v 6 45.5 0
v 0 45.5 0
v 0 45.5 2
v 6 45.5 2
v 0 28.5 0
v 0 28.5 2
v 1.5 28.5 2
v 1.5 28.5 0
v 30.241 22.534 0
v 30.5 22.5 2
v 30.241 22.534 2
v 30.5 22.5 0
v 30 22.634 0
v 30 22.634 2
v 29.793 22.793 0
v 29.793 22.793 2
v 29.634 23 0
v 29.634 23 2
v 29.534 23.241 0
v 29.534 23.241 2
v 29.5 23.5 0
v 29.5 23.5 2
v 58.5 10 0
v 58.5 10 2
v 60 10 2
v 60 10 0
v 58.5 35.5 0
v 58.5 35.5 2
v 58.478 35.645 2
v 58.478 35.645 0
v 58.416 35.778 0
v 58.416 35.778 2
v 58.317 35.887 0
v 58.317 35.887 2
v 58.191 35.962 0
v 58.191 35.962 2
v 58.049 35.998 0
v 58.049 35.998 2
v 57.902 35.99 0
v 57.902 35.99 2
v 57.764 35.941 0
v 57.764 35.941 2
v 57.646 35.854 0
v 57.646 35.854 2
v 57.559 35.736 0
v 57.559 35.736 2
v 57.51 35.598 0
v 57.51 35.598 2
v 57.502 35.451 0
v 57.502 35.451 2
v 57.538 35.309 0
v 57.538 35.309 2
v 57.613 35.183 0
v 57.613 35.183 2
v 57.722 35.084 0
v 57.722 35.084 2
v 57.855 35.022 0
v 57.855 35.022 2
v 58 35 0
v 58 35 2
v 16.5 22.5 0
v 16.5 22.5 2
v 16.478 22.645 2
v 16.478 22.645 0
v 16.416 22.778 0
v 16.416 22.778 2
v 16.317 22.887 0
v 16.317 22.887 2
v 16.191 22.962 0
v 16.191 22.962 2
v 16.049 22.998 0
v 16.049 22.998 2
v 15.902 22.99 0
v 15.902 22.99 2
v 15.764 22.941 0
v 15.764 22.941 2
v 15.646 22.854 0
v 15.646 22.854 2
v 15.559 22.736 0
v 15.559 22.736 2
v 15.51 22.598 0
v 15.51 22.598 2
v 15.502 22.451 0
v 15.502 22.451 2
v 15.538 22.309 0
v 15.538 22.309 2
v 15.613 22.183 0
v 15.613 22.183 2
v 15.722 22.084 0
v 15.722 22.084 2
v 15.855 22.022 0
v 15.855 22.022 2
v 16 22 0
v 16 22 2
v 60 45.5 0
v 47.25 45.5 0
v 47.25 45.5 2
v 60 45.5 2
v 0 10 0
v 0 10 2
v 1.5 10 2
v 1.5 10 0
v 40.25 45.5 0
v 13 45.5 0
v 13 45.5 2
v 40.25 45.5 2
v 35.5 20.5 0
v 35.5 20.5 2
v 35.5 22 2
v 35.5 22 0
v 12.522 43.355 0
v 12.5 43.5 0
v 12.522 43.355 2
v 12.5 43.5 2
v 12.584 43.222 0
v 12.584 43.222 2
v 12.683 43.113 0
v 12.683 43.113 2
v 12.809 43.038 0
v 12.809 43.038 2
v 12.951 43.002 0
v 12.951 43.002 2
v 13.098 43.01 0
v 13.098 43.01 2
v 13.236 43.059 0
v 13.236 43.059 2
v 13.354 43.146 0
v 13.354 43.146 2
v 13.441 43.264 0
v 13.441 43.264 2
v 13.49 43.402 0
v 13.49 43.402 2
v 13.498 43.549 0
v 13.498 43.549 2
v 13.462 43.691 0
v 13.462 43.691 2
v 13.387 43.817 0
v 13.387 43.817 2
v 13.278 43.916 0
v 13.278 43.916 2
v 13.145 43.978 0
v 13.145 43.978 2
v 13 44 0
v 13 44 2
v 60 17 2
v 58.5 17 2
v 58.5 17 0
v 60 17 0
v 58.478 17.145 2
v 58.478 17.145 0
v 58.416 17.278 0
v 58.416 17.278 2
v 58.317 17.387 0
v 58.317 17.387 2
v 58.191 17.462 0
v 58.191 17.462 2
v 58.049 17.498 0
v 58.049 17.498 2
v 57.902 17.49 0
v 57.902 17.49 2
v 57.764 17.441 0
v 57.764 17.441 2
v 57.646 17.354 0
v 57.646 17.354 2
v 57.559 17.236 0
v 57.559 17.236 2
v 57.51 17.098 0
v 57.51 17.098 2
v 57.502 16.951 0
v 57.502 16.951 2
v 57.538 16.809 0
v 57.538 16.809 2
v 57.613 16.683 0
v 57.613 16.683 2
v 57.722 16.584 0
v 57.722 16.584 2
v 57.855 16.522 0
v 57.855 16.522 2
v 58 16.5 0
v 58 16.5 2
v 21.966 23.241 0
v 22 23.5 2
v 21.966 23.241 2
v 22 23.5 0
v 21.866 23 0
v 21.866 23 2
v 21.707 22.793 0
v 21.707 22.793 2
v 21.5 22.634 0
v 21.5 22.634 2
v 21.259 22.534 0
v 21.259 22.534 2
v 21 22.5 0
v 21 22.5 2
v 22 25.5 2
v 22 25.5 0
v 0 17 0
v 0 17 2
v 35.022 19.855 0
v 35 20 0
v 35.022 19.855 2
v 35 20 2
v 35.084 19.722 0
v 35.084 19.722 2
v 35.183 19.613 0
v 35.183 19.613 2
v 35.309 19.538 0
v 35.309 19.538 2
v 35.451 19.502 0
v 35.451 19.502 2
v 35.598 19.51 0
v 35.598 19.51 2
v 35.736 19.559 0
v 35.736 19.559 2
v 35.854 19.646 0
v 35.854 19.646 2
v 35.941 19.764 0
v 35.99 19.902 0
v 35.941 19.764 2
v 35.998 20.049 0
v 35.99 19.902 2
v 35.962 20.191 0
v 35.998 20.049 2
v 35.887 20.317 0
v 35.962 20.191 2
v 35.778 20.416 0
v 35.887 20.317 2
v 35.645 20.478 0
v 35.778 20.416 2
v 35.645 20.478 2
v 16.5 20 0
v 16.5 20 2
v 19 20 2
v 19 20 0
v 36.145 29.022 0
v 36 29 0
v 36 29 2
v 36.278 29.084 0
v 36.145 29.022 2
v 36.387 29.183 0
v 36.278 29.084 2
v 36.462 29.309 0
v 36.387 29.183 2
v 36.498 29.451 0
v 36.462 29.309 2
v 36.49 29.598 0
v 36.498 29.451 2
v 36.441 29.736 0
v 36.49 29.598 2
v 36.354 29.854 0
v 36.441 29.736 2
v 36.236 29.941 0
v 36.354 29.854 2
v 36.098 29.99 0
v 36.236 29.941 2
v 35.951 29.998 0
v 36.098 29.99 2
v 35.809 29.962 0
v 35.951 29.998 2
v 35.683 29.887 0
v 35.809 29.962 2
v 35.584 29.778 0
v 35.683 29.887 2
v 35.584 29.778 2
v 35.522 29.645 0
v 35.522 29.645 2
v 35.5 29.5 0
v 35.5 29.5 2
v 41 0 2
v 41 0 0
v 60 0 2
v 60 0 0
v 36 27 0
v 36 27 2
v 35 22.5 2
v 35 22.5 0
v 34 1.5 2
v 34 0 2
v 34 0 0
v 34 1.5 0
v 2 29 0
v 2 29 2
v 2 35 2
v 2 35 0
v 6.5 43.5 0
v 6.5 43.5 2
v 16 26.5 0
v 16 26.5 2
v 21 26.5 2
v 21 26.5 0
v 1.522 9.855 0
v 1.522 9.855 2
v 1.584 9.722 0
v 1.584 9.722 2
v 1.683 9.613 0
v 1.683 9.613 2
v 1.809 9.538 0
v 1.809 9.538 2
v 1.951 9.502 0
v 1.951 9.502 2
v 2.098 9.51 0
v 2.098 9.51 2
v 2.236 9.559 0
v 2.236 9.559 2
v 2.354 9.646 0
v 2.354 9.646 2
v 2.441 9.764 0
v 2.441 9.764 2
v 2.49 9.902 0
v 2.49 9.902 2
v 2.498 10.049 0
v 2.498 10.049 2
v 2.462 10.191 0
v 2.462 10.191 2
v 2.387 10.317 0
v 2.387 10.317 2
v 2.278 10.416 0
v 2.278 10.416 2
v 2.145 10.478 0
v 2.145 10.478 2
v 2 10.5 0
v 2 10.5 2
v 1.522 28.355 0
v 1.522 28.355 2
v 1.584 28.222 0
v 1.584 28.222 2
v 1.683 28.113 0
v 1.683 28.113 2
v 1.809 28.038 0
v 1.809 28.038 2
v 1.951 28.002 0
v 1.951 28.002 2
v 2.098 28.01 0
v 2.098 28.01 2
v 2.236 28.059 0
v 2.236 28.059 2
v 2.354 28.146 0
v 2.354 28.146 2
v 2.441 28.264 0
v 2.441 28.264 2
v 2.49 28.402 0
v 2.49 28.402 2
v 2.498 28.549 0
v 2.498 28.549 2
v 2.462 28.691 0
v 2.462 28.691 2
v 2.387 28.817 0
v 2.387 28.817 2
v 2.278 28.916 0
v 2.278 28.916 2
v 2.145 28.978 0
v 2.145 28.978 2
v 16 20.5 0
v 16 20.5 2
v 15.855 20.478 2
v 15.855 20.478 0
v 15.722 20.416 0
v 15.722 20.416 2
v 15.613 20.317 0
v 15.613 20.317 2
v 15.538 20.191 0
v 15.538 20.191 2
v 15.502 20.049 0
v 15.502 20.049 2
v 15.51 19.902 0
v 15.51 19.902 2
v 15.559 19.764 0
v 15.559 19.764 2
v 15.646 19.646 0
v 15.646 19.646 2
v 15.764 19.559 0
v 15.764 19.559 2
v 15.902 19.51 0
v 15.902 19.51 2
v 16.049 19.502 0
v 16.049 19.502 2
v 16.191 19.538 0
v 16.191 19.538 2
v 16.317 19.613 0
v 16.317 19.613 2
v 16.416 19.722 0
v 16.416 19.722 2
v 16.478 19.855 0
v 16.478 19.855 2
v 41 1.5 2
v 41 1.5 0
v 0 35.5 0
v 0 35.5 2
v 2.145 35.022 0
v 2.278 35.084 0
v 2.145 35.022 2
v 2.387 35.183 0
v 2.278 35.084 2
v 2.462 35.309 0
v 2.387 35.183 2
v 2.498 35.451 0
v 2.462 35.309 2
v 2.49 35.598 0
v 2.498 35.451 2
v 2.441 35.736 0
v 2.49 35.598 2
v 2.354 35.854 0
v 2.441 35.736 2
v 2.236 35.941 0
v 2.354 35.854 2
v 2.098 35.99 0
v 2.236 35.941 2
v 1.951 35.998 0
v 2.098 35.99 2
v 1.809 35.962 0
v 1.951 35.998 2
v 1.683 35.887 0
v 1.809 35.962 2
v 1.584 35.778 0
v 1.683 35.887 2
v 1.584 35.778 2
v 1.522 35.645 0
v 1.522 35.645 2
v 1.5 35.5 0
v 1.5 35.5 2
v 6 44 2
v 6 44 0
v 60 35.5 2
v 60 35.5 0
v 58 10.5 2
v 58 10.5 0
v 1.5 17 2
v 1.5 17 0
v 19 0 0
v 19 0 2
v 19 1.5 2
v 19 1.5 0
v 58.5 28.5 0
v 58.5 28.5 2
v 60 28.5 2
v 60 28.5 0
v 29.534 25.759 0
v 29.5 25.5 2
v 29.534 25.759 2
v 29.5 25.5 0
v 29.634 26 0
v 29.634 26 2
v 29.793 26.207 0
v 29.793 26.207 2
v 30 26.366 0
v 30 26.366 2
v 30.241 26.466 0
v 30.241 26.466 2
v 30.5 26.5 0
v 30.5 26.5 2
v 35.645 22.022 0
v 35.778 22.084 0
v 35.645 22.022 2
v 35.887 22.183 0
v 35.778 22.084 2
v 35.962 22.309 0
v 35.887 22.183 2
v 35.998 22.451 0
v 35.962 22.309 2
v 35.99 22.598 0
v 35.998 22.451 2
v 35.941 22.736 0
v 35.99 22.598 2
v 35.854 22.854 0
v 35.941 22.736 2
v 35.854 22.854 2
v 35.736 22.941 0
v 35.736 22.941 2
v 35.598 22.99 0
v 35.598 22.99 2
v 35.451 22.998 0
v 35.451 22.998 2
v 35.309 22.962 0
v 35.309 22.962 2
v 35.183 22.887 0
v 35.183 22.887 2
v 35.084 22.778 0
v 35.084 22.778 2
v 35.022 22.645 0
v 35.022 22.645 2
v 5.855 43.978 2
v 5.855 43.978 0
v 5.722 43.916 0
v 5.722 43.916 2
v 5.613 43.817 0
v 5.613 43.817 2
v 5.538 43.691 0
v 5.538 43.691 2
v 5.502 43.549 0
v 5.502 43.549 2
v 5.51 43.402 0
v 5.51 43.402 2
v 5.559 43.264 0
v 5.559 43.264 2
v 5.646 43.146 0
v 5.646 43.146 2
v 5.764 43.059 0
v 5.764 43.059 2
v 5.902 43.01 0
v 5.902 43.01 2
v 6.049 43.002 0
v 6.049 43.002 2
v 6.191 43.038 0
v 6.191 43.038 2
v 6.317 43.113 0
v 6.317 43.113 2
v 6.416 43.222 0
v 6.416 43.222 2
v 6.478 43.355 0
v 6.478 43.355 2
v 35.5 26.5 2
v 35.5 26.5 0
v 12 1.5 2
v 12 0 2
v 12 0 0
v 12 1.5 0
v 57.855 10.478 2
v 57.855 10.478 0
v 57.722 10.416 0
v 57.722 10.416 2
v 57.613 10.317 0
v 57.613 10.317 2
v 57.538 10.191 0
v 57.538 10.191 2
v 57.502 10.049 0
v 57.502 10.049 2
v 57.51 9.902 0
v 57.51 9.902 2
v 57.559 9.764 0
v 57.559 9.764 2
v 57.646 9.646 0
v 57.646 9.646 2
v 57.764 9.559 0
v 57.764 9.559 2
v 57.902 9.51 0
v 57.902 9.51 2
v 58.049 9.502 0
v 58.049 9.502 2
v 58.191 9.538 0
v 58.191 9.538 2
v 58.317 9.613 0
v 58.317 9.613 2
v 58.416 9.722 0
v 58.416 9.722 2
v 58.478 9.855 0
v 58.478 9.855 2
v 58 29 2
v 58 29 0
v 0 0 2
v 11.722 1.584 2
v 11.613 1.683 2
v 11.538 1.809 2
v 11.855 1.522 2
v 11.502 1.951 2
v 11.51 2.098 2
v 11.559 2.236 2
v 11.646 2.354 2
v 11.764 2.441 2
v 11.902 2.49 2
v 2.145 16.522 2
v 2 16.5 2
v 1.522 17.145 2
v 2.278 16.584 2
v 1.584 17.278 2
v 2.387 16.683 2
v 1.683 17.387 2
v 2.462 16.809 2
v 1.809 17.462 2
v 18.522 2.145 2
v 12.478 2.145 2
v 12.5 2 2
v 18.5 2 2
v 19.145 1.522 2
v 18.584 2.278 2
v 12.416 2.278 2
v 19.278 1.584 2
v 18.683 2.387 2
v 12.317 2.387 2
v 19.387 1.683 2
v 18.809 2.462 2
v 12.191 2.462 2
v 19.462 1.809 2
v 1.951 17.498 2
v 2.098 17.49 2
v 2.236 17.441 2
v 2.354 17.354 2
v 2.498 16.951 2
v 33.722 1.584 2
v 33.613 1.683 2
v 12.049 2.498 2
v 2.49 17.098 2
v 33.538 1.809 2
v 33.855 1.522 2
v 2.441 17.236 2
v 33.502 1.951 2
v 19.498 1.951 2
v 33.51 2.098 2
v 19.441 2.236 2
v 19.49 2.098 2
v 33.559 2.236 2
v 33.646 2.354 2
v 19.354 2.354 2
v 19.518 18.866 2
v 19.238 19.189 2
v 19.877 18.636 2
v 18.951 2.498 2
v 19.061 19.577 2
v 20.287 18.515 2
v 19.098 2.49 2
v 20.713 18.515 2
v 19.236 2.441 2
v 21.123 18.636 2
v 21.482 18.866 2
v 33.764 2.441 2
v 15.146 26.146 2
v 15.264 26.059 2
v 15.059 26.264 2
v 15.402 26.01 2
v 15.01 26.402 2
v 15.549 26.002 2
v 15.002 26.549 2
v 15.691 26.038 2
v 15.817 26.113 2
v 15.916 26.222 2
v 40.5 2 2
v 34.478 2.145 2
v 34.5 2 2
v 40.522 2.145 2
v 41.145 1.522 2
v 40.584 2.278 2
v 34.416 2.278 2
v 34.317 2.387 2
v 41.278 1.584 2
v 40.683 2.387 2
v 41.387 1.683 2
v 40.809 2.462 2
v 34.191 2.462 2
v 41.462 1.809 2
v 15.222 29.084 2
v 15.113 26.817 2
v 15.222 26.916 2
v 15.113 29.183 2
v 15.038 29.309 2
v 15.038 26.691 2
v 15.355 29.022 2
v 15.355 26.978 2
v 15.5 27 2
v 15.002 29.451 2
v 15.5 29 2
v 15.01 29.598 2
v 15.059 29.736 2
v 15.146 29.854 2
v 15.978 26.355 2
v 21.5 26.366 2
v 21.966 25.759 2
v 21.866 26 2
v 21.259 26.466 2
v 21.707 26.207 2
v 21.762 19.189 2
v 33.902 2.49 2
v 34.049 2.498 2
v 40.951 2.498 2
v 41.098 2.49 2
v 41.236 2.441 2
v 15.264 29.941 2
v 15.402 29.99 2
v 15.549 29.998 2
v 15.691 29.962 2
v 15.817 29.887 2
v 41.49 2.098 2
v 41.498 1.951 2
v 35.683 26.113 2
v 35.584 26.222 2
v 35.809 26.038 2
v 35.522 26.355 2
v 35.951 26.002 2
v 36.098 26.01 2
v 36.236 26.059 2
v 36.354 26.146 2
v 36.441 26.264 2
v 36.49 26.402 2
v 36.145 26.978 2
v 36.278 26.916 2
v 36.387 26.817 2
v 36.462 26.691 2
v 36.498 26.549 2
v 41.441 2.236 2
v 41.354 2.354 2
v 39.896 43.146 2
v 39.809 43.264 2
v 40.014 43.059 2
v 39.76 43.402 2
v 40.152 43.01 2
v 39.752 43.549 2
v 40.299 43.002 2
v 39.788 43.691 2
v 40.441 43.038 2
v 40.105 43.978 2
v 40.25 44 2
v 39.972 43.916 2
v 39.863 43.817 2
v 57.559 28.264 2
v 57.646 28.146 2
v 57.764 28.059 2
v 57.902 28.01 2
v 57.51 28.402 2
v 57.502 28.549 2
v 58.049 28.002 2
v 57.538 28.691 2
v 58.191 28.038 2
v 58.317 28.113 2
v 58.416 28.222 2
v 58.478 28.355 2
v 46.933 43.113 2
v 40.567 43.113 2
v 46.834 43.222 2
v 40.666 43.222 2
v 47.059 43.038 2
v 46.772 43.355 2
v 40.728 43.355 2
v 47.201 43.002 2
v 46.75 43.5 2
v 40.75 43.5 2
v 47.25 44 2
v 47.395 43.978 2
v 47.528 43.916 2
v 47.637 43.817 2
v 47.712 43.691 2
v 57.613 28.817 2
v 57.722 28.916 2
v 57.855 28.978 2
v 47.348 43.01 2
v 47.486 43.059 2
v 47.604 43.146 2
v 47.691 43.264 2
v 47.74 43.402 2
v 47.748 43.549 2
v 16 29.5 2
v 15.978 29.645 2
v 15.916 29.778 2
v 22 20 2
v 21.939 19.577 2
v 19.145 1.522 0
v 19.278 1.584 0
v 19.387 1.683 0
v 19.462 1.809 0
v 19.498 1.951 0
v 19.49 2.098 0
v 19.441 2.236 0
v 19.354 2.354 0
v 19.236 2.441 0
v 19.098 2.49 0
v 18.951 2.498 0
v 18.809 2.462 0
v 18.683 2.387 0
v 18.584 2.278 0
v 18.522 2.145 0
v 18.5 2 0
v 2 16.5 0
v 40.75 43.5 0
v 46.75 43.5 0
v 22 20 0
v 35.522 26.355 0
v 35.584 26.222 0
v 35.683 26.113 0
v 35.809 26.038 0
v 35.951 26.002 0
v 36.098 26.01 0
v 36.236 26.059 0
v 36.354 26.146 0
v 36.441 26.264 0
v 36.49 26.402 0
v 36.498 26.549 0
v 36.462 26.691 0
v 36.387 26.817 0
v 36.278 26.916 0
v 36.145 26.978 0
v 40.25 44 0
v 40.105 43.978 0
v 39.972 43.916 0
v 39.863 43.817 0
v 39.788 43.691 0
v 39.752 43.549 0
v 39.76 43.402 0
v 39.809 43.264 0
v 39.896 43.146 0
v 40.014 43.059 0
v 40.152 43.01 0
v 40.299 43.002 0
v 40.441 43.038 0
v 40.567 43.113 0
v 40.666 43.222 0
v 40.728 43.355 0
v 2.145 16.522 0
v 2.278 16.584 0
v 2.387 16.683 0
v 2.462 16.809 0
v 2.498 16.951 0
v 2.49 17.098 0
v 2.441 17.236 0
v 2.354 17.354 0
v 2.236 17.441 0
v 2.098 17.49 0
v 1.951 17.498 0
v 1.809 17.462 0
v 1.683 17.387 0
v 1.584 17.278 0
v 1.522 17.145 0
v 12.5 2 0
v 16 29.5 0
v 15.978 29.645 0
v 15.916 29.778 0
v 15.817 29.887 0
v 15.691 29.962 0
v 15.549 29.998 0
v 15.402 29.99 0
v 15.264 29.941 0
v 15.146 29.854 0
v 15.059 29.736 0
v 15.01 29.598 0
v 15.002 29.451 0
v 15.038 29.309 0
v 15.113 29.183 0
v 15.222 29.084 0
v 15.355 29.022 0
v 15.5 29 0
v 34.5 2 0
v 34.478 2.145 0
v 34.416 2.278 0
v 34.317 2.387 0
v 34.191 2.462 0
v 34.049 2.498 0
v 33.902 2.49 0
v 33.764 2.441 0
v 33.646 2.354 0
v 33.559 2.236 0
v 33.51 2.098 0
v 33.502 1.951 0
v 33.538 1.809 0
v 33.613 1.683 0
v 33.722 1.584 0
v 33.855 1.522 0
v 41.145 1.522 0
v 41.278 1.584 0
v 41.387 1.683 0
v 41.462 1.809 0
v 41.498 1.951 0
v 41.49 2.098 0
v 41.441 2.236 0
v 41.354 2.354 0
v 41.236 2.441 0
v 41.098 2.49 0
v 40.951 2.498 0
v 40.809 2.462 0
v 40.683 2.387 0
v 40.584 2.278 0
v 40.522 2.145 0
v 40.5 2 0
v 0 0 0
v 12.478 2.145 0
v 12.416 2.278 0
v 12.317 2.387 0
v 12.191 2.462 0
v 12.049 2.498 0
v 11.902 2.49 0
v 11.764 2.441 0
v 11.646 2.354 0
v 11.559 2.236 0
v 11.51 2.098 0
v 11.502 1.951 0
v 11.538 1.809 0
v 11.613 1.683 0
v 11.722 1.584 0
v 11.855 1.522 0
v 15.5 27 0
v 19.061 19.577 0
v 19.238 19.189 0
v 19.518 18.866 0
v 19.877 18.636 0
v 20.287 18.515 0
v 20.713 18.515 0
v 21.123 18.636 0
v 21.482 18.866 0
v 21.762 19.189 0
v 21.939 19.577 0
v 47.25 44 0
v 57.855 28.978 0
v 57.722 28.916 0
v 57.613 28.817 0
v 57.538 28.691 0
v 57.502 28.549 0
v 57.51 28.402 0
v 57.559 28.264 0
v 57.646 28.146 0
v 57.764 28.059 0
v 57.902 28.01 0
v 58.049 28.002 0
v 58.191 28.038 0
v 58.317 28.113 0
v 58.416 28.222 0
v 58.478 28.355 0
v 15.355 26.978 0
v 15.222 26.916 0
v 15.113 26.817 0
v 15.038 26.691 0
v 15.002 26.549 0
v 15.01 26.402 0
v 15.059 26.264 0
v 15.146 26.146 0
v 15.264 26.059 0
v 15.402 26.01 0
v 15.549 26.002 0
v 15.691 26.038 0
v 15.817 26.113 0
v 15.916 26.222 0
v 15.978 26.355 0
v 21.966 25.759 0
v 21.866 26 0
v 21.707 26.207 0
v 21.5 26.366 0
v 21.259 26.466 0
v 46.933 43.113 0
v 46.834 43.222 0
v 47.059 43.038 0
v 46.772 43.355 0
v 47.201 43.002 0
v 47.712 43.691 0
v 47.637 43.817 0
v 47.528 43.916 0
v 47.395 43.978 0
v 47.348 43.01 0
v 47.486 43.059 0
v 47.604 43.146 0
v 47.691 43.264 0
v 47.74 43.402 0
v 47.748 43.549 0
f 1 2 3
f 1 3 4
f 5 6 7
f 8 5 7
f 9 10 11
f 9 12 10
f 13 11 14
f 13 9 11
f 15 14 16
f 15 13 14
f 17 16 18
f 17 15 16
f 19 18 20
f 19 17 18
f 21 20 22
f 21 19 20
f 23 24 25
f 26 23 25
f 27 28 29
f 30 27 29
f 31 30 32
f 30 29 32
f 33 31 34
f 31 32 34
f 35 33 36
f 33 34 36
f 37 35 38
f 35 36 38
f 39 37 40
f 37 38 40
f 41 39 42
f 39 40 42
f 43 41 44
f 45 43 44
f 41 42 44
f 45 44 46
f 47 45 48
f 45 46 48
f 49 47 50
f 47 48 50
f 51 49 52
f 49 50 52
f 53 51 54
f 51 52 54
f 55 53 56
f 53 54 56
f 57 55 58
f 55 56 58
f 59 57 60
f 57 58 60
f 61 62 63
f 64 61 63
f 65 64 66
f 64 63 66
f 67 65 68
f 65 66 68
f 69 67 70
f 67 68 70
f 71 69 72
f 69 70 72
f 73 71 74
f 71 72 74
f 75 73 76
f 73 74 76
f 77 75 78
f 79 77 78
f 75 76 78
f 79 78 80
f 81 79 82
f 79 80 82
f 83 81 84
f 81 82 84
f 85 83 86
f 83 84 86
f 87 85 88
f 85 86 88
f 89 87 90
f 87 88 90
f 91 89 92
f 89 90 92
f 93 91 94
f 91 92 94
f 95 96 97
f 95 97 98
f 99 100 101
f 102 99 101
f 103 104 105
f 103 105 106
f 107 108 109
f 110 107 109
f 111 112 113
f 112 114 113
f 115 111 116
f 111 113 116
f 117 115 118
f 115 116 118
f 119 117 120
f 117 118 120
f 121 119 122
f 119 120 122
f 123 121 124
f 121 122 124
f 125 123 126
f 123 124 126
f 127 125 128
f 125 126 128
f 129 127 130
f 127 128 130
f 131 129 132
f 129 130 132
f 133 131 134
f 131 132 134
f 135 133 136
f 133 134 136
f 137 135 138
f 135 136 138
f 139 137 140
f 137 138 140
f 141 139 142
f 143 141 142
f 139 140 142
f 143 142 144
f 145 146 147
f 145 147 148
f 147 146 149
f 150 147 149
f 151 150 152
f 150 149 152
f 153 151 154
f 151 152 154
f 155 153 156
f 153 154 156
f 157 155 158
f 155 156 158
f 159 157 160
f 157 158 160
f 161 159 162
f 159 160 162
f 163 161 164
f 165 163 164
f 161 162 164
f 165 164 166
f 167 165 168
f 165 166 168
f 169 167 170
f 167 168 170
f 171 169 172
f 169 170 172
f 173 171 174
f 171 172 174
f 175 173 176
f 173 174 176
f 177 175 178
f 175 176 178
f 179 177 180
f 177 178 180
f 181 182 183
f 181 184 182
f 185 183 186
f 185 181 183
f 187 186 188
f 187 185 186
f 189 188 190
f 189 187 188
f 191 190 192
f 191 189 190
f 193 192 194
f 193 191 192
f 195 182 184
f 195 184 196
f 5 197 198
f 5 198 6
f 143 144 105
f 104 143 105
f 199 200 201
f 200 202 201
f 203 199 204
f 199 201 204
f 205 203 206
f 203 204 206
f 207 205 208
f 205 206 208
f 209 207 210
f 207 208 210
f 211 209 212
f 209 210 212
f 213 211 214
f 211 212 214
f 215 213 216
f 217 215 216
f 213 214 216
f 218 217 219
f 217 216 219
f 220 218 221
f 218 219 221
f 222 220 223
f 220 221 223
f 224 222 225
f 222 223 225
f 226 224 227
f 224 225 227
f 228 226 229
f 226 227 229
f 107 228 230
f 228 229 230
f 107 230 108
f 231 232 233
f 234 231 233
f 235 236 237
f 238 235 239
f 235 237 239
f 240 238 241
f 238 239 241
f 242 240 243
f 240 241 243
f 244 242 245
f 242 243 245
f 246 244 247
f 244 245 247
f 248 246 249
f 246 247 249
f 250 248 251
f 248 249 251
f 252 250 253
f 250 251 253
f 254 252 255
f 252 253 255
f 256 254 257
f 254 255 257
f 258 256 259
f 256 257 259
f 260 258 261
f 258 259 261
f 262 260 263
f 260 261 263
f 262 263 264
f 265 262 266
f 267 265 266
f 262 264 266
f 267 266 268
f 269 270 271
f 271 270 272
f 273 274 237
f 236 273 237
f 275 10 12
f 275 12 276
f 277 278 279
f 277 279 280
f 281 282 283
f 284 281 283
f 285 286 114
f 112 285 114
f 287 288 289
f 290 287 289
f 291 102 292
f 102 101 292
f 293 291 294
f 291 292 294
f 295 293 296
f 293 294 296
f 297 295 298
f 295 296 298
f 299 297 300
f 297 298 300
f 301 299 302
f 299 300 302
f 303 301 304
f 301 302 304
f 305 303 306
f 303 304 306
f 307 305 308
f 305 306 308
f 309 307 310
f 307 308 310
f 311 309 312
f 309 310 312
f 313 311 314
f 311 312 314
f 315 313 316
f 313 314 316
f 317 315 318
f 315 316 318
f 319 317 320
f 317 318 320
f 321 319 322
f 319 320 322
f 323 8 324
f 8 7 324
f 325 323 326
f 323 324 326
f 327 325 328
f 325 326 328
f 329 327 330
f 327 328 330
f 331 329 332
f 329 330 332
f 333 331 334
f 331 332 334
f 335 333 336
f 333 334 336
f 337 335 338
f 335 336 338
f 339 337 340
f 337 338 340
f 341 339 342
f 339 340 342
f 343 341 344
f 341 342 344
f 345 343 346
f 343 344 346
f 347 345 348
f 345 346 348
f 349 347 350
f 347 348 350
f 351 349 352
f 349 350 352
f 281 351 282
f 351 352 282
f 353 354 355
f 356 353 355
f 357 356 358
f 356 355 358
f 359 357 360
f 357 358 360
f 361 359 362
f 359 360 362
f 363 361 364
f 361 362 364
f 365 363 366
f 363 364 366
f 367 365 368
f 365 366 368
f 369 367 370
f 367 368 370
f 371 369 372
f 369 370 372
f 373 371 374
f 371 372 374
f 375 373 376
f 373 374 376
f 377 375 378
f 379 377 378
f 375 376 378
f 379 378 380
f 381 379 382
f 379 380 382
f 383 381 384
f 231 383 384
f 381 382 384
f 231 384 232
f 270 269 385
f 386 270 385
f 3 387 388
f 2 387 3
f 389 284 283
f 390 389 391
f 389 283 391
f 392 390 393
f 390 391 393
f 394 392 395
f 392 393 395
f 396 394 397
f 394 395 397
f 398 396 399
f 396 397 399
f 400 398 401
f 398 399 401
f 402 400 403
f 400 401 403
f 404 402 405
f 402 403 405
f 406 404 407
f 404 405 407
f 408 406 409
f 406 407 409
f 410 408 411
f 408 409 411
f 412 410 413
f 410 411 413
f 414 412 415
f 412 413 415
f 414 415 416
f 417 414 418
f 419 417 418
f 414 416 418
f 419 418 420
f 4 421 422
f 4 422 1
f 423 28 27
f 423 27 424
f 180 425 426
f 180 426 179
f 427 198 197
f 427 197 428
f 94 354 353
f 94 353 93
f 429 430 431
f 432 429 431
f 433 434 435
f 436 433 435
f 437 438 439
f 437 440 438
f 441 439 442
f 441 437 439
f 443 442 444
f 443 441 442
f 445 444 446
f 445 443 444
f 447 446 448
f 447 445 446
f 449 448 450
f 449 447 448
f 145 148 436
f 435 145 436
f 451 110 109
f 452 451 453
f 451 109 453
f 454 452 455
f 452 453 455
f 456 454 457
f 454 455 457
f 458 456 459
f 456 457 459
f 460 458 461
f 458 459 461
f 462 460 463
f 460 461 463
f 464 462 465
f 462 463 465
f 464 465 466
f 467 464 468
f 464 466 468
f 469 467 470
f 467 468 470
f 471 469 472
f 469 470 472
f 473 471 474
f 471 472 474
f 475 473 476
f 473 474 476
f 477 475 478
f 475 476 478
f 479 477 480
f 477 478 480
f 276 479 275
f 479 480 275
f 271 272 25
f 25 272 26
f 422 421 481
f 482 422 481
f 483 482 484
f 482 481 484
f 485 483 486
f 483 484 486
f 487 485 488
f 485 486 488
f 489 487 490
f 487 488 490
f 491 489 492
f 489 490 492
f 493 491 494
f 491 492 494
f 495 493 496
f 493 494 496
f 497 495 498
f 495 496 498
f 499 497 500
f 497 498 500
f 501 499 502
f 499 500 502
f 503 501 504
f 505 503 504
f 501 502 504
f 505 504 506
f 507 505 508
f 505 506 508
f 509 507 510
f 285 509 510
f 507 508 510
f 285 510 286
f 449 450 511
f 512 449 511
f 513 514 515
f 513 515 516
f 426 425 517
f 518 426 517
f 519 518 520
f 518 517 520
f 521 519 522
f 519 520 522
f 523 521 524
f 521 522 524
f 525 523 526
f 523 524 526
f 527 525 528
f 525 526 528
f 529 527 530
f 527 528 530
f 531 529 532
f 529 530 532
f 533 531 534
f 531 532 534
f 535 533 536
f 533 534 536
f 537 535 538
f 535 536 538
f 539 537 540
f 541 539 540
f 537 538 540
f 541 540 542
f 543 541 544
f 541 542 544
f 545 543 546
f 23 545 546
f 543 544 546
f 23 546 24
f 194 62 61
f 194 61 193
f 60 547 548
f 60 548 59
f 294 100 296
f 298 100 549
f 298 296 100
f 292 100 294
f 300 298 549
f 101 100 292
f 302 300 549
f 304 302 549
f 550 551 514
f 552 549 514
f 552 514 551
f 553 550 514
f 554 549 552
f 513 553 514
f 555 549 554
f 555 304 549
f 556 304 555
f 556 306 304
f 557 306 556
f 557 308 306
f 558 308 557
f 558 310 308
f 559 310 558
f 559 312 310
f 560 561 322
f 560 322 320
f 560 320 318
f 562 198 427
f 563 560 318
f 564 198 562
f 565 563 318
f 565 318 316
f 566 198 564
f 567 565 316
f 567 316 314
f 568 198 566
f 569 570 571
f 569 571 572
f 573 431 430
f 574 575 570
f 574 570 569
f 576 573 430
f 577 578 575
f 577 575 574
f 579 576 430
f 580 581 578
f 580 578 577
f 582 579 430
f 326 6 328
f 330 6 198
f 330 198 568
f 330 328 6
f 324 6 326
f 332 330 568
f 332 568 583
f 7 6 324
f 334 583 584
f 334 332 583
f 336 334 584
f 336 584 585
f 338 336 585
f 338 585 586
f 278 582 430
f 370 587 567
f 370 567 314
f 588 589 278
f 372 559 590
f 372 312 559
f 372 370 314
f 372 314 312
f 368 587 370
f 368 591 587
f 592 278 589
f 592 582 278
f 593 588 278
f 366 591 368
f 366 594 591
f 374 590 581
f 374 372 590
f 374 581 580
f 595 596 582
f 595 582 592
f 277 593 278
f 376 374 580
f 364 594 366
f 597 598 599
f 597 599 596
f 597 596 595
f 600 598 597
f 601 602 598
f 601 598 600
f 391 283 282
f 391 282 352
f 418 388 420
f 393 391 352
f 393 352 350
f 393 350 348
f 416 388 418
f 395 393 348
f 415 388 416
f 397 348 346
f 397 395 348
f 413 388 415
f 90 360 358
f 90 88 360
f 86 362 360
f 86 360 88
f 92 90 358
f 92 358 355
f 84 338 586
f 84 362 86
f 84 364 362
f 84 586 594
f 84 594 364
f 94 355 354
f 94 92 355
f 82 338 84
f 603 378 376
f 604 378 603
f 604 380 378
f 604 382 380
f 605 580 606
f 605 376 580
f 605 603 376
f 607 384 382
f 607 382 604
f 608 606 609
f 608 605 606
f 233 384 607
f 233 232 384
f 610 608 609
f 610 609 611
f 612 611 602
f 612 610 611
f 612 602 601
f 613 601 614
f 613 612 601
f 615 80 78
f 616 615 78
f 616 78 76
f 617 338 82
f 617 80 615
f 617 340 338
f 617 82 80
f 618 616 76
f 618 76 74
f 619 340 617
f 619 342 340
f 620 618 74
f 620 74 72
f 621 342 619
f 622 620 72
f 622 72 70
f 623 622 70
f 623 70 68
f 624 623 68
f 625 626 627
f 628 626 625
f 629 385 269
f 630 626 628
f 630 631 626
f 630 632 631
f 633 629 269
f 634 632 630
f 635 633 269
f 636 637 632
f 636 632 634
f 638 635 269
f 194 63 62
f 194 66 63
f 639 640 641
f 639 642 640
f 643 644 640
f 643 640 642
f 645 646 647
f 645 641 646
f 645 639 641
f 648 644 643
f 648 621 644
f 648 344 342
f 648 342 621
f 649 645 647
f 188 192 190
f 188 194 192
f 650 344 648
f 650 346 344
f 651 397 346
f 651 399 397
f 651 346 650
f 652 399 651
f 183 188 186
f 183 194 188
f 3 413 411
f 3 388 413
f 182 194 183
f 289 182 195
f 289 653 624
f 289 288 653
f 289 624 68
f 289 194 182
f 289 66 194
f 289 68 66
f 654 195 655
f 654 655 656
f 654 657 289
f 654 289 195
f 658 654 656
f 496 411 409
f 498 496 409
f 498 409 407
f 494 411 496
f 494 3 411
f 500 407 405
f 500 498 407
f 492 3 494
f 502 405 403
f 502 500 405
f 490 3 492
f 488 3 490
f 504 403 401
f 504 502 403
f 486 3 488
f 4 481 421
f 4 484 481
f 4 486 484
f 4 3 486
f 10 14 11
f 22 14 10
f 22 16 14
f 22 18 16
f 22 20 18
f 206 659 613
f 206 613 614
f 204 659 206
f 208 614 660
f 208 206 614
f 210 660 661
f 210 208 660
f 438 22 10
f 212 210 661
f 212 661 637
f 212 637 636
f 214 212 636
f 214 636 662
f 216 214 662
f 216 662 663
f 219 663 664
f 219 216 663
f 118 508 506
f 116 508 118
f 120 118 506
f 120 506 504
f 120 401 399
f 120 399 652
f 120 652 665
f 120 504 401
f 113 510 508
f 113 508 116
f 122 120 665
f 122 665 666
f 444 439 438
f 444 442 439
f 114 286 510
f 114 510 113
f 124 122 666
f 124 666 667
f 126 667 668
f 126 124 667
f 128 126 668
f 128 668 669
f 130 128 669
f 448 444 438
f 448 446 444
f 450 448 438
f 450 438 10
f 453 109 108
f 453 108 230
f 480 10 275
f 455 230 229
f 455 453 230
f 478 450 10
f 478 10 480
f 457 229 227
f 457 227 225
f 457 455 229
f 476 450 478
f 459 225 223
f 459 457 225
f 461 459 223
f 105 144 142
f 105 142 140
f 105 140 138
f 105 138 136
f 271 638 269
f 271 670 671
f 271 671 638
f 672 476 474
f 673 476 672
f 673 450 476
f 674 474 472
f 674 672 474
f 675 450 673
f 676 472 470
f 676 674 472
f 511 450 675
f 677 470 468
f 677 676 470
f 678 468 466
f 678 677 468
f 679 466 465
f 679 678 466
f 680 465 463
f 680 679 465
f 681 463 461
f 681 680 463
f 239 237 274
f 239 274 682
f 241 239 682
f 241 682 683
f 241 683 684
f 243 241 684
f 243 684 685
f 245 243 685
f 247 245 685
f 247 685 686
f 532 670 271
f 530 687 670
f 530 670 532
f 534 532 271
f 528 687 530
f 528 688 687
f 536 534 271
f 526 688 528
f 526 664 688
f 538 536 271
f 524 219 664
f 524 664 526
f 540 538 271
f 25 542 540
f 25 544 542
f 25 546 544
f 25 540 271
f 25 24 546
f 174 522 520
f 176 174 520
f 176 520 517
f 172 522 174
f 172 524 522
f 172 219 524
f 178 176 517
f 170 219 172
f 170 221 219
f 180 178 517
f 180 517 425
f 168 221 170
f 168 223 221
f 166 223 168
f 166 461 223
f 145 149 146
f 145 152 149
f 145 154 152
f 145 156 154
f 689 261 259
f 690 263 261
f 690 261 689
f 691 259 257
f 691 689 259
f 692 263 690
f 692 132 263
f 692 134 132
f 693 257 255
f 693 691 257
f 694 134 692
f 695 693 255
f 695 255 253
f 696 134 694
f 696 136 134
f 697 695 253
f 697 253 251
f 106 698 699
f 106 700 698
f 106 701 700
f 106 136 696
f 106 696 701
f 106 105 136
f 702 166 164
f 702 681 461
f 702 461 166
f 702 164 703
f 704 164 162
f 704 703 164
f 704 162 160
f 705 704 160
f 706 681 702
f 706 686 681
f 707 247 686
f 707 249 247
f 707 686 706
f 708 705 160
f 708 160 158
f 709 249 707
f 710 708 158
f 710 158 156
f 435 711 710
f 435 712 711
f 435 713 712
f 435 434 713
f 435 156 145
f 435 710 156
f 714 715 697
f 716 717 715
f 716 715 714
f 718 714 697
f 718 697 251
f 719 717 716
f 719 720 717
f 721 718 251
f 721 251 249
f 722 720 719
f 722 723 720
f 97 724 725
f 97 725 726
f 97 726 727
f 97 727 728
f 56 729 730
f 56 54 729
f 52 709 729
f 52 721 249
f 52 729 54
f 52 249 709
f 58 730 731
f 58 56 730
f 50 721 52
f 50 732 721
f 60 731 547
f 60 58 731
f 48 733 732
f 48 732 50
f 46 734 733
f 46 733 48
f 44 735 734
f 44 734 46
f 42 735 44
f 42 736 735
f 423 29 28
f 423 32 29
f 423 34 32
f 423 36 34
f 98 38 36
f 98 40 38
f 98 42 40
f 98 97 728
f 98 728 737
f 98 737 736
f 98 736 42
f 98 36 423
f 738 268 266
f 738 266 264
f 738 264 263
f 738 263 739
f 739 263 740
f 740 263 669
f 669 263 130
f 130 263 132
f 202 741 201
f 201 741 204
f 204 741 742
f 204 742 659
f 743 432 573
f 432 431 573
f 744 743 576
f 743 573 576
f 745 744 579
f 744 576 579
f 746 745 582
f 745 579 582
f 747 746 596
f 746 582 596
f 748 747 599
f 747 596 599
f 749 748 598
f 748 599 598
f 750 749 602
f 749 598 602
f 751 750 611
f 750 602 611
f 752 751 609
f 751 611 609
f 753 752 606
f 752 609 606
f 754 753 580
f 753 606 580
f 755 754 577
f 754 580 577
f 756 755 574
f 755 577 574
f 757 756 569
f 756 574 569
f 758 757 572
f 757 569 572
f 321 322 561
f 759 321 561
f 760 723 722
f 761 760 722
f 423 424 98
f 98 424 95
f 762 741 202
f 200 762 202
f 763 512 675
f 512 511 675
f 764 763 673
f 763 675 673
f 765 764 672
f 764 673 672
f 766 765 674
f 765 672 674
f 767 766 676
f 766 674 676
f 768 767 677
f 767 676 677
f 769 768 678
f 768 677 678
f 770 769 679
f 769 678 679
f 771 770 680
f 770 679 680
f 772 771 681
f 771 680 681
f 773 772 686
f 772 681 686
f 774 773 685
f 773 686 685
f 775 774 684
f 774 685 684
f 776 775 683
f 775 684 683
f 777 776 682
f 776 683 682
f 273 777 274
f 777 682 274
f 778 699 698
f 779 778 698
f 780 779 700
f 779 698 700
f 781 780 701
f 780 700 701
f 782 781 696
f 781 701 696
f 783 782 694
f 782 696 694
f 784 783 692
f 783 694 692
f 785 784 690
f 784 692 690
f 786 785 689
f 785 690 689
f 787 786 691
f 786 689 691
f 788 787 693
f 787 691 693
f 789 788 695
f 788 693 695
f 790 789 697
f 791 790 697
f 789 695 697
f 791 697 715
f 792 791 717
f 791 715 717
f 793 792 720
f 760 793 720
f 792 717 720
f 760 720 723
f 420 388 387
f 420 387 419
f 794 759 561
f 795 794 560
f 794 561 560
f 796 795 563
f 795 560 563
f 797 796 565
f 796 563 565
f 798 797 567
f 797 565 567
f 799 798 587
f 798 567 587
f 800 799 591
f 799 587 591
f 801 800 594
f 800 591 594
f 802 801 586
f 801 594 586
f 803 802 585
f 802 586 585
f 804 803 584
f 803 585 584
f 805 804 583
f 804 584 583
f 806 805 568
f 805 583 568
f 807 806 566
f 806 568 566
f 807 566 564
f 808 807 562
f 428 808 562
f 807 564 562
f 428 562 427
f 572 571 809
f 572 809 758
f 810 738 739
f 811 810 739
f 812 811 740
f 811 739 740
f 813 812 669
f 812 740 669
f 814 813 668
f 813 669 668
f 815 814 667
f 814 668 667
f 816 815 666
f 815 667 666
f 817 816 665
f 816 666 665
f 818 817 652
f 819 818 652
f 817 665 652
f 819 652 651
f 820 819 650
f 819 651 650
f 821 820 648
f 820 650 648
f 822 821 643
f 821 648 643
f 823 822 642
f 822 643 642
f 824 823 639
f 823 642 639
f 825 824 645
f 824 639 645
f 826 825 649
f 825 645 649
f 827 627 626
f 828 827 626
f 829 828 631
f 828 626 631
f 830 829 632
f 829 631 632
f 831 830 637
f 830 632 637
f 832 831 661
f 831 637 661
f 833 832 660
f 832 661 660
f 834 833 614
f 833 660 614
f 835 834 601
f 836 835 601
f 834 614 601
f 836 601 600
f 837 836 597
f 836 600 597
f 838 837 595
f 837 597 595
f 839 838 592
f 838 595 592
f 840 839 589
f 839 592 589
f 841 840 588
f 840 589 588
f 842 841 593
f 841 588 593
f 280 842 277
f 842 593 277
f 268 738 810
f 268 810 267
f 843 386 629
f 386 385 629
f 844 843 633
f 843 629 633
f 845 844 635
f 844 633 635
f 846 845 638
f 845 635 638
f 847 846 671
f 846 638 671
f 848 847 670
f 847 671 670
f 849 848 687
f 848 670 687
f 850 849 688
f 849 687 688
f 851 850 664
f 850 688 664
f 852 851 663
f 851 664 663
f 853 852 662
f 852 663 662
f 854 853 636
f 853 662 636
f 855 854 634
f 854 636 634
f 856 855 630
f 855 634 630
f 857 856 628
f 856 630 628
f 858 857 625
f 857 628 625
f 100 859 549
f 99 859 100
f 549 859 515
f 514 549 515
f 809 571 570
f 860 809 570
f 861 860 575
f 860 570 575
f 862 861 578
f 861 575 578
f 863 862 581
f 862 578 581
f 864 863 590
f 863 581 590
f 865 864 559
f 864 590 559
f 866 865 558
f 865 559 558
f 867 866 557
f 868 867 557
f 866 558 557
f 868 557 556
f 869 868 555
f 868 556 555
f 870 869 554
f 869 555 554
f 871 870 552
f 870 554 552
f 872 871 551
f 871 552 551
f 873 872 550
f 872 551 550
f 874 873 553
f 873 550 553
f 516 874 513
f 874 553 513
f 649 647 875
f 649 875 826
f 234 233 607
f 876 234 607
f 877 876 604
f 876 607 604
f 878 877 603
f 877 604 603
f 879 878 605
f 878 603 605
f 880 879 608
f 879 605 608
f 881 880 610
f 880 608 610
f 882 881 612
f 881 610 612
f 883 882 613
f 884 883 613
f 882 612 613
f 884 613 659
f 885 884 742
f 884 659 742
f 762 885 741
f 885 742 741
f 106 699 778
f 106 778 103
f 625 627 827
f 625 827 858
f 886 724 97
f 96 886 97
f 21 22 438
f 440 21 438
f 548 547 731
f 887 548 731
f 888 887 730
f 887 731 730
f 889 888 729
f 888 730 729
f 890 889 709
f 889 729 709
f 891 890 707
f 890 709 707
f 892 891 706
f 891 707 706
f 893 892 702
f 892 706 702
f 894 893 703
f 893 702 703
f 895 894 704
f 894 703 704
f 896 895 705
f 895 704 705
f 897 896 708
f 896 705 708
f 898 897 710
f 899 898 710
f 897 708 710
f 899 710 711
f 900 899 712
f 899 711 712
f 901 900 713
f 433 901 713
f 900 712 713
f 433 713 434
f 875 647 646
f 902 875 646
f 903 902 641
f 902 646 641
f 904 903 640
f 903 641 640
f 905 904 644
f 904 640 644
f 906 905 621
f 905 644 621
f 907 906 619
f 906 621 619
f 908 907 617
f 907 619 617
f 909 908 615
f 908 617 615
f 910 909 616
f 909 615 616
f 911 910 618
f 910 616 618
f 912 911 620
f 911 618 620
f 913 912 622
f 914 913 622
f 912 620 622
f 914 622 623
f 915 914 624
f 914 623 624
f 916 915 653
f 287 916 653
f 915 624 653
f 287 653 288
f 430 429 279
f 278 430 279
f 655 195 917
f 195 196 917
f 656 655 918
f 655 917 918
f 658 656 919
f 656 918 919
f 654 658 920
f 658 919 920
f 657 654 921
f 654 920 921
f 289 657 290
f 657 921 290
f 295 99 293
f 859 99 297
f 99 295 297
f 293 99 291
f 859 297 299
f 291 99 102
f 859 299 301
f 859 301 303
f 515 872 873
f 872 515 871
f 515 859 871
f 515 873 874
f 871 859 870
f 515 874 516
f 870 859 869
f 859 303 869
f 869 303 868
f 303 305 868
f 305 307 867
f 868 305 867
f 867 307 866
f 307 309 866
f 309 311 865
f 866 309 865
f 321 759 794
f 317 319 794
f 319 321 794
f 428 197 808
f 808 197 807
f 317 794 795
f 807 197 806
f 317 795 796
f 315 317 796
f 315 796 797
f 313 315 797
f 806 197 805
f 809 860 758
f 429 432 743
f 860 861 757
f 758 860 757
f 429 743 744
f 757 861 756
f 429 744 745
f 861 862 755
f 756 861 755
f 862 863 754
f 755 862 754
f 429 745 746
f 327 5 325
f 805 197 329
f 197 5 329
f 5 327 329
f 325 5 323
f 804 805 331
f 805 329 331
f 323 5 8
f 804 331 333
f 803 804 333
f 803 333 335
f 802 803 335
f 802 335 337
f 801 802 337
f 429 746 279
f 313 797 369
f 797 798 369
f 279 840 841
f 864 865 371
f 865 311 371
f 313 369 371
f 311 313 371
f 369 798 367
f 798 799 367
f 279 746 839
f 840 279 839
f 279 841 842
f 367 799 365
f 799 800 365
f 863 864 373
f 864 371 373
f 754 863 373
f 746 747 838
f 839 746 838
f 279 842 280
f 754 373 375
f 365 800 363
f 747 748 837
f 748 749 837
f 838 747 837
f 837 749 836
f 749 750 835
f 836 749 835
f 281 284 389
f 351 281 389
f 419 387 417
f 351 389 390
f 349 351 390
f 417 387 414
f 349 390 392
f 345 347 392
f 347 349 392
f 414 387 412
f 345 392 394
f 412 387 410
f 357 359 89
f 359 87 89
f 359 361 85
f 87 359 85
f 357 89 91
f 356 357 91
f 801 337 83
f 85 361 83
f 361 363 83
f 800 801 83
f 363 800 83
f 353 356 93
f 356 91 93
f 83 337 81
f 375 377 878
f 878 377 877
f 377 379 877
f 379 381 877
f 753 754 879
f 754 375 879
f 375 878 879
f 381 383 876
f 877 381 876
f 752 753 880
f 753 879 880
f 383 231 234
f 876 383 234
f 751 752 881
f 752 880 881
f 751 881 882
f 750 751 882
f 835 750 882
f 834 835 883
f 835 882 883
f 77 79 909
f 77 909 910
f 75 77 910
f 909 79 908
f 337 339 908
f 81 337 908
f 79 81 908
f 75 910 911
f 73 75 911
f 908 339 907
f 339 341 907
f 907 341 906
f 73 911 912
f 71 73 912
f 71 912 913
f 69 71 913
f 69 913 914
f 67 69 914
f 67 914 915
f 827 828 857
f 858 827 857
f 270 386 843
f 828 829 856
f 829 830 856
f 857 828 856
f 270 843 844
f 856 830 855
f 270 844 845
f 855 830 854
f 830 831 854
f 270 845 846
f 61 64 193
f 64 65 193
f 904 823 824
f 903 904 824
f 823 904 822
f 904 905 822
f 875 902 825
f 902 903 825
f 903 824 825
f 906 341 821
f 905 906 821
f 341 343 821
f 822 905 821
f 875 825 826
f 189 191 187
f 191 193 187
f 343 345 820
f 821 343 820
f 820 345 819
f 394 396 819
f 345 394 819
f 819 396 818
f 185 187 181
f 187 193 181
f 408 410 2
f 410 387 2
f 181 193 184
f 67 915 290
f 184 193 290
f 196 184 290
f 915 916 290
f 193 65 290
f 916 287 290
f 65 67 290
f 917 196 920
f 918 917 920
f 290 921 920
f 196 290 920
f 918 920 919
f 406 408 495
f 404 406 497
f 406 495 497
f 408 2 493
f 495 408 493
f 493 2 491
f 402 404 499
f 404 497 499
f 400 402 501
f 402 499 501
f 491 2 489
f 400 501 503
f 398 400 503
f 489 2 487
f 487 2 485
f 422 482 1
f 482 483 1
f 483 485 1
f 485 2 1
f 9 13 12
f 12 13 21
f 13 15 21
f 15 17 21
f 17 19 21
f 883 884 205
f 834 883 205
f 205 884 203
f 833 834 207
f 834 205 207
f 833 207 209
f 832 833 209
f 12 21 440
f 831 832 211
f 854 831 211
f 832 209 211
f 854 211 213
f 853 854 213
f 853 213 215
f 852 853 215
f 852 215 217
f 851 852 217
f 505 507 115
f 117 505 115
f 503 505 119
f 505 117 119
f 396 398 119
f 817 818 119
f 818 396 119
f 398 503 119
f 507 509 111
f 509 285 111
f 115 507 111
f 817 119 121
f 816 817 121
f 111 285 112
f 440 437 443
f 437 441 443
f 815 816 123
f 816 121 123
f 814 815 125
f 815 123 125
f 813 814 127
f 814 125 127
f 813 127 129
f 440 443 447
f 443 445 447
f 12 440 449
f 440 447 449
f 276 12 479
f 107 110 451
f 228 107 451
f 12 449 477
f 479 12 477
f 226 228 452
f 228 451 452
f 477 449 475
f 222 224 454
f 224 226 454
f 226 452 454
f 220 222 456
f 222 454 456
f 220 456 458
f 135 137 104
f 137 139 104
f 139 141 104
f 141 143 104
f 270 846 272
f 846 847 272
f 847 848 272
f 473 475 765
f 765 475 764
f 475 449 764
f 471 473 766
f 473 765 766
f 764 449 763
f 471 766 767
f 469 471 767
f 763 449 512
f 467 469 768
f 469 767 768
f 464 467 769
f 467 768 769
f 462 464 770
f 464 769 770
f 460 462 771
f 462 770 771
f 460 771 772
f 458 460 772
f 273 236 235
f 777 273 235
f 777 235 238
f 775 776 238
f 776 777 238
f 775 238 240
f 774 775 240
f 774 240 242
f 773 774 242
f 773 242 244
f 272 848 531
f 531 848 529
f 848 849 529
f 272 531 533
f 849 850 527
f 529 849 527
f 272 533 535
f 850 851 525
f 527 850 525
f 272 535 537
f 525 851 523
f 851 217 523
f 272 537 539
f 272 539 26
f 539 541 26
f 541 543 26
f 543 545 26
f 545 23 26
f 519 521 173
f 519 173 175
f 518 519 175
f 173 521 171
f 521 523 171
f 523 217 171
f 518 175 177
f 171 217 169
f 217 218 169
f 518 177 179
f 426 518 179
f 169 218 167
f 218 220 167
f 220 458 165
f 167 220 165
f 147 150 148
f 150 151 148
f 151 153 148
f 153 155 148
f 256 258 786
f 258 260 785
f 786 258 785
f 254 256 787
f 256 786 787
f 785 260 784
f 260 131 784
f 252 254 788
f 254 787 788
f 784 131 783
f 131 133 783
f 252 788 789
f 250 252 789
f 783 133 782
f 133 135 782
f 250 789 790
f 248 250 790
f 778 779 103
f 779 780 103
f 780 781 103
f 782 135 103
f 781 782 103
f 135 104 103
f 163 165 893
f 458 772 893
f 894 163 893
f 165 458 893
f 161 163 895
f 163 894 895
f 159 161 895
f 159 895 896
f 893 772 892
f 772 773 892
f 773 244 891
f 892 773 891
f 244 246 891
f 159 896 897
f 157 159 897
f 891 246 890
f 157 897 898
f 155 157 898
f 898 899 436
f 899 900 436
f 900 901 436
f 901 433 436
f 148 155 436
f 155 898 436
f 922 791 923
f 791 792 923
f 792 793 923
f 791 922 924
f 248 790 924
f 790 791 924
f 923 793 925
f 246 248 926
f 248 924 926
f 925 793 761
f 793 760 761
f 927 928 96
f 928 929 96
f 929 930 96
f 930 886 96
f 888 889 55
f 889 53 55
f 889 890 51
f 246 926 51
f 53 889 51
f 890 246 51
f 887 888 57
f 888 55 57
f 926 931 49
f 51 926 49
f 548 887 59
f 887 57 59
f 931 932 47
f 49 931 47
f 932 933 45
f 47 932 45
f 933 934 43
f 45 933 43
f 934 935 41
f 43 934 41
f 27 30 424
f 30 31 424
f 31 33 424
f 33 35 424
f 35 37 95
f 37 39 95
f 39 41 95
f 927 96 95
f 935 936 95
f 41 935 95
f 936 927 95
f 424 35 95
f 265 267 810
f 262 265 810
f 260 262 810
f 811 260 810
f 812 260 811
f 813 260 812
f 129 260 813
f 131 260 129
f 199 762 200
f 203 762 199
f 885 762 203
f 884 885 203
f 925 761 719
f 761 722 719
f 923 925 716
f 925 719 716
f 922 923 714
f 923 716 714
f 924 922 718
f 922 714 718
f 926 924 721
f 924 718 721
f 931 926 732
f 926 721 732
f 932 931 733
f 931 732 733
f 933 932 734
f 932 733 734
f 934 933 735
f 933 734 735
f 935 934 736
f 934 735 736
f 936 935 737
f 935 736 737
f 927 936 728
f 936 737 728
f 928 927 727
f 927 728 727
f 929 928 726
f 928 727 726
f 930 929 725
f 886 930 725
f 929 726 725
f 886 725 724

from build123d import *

# Parameters (mm, degrees)
SKETCH_1_W          = 60
SKETCH_1_H          = 45.5
EXTRUDE_1_DEPTH     = 2
SKETCH_2_W          = 7
SKETCH_2_H          = 2
SKETCH_2_W_2        = 2
SKETCH_2_H_2        = 7
CUT_EXTRUDE_1_DEPTH = 76.327617777
SKETCH_4_R          = 0.5
CUT_EXTRUDE_2_DEPTH = 76.327617777
SKETCH_5_W          = 20.5
SKETCH_5_H          = 8
CUT_EXTRUDE_3_DEPTH = 76.327617777
SKETCH_6_W          = 6.5
SKETCH_6_H          = 5
EXTRUDE_2_DEPTH     = 2
SKETCH_7_R          = 0.5
CUT_EXTRUDE_4_DEPTH = 76.327617777
SKETCH_8_W          = 19.5
SKETCH_8_H          = 2.5
CUT_EXTRUDE_5_DEPTH = 76.327617777
FILLET_1_R          = 1
SKETCH_9_R          = 0.5
CUT_EXTRUDE_6_DEPTH = 2
SKETCH_10_R         = 1.5
CUT_EXTRUDE_7_DEPTH = 76.327617777


with BuildPart() as part:
    # 草图1 → 凸台-拉伸1 (new body)
    with BuildSketch(Plane.XY):
        with Locations((30, 22.75)):
            Rectangle(SKETCH_1_W, SKETCH_1_H)
    extrude(amount=EXTRUDE_1_DEPTH)

    # 草图2 → 切除-拉伸1 (cut, through all)
    with BuildSketch(Plane.XY.offset(2)):
        with Locations((9.5, 44.5)):
            Rectangle(SKETCH_2_W, SKETCH_2_H)
        with Locations((43.75, 44.5)):
            Rectangle(SKETCH_2_W, SKETCH_2_H)
        with Locations((15.5, 1)):
            Rectangle(SKETCH_2_W, SKETCH_2_H)
        with Locations((37.5, 1)):
            Rectangle(SKETCH_2_W, SKETCH_2_H)
        with Locations((1, 32)):
            Rectangle(SKETCH_2_W_2, SKETCH_2_H_2)
        with Locations((1, 13.5)):
            Rectangle(SKETCH_2_W_2, SKETCH_2_H_2)
        with Locations((59, 32)):
            Rectangle(SKETCH_2_W_2, SKETCH_2_H_2)
        with Locations((59, 13.5)):
            Rectangle(SKETCH_2_W_2, SKETCH_2_H_2)
    extrude(amount=-CUT_EXTRUDE_1_DEPTH, mode=Mode.SUBTRACT)

    # 草图4 → 切除-拉伸2 (cut, through all)
    with BuildSketch(Plane.XY.offset(2)):
        with Locations((6, 43.5)):
            Circle(SKETCH_4_R)
    cut_extrude_2 = extrude(amount=-CUT_EXTRUDE_2_DEPTH, mode=Mode.SUBTRACT)

    # 草图5 → 切除-拉伸3 (cut, through all)
    with BuildSketch(Plane.XY.offset(2)):
        with Locations((25.75, 25.5)):
            Rectangle(SKETCH_5_W, SKETCH_5_H)
    extrude(amount=-CUT_EXTRUDE_3_DEPTH, mode=Mode.SUBTRACT)

    # 草图6 → 凸台-拉伸2 (add)
    with BuildSketch(Plane.XY.offset(2)):
        with Locations((18.75, 24)):
            Rectangle(SKETCH_6_W, SKETCH_6_H)
        with Locations((32.75, 24)):
            Rectangle(SKETCH_6_W, SKETCH_6_H)
    extrude(amount=-EXTRUDE_2_DEPTH)

    # 草图7 → 切除-拉伸4 (cut, through all)
    with BuildSketch(Plane.XY.offset(2)):
        with Locations((15.5, 29.5)):
            Circle(SKETCH_7_R)
        with Locations((15.5, 26.5)):
            Circle(SKETCH_7_R)
        with Locations((36, 29.5)):
            Circle(SKETCH_7_R)
        with Locations((36, 26.5)):
            Circle(SKETCH_7_R)
    extrude(amount=-CUT_EXTRUDE_4_DEPTH, mode=Mode.SUBTRACT)

    # 草图8 → 切除-拉伸5 (cut, through all)
    with BuildSketch(Plane.XY.offset(2)):
        with Locations((25.75, 21.25)):
            Rectangle(SKETCH_8_W, SKETCH_8_H)
    extrude(amount=-CUT_EXTRUDE_5_DEPTH, mode=Mode.SUBTRACT)

    # 圆角1
    fillet_1_edges = [part.edges().sort_by_distance(p)[0] for p in [
        (22, 26.5, 1),
        (29.5, 26.5, 1),
        (29.5, 22.5, 1),
        (22, 22.5, 1),
    ]]
    fillet(fillet_1_edges, radius=FILLET_1_R)

    # 草图阵列1: 切除-拉伸2 at 15 more places
    with Locations((7, 0, 0), (34.25, 0, 0), (41.25, 0, 0), (6, -41.5, 0), (13, -41.5, 0), (28, -41.5, 0), (35, -41.5, 0), (-4, -8, 0), (-4, -15, 0), (-4, -26.5, 0), (-4, -33.5, 0), (52, -8, 0), (52, -15, 0), (52, -26.5, 0), (52, -33.5, 0)):
        add(cut_extrude_2, mode=Mode.SUBTRACT)

    # 草图9 → 切除-拉伸6 (cut)
    with BuildSketch(Plane.XY.offset(2)):
        with Locations((16, 20)):
            Circle(SKETCH_9_R)
        with Locations((16, 22.5)):
            Circle(SKETCH_9_R)
        with Locations((35.5, 20)):
            Circle(SKETCH_9_R)
        with Locations((35.5, 22.5)):
            Circle(SKETCH_9_R)
    extrude(amount=-CUT_EXTRUDE_6_DEPTH, mode=Mode.SUBTRACT)

    # 草图10 → 切除-拉伸7 (cut, through all)
    with BuildSketch(Plane.XY.offset(2)):
        with Locations((20.5, 20)):
            Circle(SKETCH_10_R)
    extrude(amount=-CUT_EXTRUDE_7_DEPTH, mode=Mode.SUBTRACT)


solid = part.part
